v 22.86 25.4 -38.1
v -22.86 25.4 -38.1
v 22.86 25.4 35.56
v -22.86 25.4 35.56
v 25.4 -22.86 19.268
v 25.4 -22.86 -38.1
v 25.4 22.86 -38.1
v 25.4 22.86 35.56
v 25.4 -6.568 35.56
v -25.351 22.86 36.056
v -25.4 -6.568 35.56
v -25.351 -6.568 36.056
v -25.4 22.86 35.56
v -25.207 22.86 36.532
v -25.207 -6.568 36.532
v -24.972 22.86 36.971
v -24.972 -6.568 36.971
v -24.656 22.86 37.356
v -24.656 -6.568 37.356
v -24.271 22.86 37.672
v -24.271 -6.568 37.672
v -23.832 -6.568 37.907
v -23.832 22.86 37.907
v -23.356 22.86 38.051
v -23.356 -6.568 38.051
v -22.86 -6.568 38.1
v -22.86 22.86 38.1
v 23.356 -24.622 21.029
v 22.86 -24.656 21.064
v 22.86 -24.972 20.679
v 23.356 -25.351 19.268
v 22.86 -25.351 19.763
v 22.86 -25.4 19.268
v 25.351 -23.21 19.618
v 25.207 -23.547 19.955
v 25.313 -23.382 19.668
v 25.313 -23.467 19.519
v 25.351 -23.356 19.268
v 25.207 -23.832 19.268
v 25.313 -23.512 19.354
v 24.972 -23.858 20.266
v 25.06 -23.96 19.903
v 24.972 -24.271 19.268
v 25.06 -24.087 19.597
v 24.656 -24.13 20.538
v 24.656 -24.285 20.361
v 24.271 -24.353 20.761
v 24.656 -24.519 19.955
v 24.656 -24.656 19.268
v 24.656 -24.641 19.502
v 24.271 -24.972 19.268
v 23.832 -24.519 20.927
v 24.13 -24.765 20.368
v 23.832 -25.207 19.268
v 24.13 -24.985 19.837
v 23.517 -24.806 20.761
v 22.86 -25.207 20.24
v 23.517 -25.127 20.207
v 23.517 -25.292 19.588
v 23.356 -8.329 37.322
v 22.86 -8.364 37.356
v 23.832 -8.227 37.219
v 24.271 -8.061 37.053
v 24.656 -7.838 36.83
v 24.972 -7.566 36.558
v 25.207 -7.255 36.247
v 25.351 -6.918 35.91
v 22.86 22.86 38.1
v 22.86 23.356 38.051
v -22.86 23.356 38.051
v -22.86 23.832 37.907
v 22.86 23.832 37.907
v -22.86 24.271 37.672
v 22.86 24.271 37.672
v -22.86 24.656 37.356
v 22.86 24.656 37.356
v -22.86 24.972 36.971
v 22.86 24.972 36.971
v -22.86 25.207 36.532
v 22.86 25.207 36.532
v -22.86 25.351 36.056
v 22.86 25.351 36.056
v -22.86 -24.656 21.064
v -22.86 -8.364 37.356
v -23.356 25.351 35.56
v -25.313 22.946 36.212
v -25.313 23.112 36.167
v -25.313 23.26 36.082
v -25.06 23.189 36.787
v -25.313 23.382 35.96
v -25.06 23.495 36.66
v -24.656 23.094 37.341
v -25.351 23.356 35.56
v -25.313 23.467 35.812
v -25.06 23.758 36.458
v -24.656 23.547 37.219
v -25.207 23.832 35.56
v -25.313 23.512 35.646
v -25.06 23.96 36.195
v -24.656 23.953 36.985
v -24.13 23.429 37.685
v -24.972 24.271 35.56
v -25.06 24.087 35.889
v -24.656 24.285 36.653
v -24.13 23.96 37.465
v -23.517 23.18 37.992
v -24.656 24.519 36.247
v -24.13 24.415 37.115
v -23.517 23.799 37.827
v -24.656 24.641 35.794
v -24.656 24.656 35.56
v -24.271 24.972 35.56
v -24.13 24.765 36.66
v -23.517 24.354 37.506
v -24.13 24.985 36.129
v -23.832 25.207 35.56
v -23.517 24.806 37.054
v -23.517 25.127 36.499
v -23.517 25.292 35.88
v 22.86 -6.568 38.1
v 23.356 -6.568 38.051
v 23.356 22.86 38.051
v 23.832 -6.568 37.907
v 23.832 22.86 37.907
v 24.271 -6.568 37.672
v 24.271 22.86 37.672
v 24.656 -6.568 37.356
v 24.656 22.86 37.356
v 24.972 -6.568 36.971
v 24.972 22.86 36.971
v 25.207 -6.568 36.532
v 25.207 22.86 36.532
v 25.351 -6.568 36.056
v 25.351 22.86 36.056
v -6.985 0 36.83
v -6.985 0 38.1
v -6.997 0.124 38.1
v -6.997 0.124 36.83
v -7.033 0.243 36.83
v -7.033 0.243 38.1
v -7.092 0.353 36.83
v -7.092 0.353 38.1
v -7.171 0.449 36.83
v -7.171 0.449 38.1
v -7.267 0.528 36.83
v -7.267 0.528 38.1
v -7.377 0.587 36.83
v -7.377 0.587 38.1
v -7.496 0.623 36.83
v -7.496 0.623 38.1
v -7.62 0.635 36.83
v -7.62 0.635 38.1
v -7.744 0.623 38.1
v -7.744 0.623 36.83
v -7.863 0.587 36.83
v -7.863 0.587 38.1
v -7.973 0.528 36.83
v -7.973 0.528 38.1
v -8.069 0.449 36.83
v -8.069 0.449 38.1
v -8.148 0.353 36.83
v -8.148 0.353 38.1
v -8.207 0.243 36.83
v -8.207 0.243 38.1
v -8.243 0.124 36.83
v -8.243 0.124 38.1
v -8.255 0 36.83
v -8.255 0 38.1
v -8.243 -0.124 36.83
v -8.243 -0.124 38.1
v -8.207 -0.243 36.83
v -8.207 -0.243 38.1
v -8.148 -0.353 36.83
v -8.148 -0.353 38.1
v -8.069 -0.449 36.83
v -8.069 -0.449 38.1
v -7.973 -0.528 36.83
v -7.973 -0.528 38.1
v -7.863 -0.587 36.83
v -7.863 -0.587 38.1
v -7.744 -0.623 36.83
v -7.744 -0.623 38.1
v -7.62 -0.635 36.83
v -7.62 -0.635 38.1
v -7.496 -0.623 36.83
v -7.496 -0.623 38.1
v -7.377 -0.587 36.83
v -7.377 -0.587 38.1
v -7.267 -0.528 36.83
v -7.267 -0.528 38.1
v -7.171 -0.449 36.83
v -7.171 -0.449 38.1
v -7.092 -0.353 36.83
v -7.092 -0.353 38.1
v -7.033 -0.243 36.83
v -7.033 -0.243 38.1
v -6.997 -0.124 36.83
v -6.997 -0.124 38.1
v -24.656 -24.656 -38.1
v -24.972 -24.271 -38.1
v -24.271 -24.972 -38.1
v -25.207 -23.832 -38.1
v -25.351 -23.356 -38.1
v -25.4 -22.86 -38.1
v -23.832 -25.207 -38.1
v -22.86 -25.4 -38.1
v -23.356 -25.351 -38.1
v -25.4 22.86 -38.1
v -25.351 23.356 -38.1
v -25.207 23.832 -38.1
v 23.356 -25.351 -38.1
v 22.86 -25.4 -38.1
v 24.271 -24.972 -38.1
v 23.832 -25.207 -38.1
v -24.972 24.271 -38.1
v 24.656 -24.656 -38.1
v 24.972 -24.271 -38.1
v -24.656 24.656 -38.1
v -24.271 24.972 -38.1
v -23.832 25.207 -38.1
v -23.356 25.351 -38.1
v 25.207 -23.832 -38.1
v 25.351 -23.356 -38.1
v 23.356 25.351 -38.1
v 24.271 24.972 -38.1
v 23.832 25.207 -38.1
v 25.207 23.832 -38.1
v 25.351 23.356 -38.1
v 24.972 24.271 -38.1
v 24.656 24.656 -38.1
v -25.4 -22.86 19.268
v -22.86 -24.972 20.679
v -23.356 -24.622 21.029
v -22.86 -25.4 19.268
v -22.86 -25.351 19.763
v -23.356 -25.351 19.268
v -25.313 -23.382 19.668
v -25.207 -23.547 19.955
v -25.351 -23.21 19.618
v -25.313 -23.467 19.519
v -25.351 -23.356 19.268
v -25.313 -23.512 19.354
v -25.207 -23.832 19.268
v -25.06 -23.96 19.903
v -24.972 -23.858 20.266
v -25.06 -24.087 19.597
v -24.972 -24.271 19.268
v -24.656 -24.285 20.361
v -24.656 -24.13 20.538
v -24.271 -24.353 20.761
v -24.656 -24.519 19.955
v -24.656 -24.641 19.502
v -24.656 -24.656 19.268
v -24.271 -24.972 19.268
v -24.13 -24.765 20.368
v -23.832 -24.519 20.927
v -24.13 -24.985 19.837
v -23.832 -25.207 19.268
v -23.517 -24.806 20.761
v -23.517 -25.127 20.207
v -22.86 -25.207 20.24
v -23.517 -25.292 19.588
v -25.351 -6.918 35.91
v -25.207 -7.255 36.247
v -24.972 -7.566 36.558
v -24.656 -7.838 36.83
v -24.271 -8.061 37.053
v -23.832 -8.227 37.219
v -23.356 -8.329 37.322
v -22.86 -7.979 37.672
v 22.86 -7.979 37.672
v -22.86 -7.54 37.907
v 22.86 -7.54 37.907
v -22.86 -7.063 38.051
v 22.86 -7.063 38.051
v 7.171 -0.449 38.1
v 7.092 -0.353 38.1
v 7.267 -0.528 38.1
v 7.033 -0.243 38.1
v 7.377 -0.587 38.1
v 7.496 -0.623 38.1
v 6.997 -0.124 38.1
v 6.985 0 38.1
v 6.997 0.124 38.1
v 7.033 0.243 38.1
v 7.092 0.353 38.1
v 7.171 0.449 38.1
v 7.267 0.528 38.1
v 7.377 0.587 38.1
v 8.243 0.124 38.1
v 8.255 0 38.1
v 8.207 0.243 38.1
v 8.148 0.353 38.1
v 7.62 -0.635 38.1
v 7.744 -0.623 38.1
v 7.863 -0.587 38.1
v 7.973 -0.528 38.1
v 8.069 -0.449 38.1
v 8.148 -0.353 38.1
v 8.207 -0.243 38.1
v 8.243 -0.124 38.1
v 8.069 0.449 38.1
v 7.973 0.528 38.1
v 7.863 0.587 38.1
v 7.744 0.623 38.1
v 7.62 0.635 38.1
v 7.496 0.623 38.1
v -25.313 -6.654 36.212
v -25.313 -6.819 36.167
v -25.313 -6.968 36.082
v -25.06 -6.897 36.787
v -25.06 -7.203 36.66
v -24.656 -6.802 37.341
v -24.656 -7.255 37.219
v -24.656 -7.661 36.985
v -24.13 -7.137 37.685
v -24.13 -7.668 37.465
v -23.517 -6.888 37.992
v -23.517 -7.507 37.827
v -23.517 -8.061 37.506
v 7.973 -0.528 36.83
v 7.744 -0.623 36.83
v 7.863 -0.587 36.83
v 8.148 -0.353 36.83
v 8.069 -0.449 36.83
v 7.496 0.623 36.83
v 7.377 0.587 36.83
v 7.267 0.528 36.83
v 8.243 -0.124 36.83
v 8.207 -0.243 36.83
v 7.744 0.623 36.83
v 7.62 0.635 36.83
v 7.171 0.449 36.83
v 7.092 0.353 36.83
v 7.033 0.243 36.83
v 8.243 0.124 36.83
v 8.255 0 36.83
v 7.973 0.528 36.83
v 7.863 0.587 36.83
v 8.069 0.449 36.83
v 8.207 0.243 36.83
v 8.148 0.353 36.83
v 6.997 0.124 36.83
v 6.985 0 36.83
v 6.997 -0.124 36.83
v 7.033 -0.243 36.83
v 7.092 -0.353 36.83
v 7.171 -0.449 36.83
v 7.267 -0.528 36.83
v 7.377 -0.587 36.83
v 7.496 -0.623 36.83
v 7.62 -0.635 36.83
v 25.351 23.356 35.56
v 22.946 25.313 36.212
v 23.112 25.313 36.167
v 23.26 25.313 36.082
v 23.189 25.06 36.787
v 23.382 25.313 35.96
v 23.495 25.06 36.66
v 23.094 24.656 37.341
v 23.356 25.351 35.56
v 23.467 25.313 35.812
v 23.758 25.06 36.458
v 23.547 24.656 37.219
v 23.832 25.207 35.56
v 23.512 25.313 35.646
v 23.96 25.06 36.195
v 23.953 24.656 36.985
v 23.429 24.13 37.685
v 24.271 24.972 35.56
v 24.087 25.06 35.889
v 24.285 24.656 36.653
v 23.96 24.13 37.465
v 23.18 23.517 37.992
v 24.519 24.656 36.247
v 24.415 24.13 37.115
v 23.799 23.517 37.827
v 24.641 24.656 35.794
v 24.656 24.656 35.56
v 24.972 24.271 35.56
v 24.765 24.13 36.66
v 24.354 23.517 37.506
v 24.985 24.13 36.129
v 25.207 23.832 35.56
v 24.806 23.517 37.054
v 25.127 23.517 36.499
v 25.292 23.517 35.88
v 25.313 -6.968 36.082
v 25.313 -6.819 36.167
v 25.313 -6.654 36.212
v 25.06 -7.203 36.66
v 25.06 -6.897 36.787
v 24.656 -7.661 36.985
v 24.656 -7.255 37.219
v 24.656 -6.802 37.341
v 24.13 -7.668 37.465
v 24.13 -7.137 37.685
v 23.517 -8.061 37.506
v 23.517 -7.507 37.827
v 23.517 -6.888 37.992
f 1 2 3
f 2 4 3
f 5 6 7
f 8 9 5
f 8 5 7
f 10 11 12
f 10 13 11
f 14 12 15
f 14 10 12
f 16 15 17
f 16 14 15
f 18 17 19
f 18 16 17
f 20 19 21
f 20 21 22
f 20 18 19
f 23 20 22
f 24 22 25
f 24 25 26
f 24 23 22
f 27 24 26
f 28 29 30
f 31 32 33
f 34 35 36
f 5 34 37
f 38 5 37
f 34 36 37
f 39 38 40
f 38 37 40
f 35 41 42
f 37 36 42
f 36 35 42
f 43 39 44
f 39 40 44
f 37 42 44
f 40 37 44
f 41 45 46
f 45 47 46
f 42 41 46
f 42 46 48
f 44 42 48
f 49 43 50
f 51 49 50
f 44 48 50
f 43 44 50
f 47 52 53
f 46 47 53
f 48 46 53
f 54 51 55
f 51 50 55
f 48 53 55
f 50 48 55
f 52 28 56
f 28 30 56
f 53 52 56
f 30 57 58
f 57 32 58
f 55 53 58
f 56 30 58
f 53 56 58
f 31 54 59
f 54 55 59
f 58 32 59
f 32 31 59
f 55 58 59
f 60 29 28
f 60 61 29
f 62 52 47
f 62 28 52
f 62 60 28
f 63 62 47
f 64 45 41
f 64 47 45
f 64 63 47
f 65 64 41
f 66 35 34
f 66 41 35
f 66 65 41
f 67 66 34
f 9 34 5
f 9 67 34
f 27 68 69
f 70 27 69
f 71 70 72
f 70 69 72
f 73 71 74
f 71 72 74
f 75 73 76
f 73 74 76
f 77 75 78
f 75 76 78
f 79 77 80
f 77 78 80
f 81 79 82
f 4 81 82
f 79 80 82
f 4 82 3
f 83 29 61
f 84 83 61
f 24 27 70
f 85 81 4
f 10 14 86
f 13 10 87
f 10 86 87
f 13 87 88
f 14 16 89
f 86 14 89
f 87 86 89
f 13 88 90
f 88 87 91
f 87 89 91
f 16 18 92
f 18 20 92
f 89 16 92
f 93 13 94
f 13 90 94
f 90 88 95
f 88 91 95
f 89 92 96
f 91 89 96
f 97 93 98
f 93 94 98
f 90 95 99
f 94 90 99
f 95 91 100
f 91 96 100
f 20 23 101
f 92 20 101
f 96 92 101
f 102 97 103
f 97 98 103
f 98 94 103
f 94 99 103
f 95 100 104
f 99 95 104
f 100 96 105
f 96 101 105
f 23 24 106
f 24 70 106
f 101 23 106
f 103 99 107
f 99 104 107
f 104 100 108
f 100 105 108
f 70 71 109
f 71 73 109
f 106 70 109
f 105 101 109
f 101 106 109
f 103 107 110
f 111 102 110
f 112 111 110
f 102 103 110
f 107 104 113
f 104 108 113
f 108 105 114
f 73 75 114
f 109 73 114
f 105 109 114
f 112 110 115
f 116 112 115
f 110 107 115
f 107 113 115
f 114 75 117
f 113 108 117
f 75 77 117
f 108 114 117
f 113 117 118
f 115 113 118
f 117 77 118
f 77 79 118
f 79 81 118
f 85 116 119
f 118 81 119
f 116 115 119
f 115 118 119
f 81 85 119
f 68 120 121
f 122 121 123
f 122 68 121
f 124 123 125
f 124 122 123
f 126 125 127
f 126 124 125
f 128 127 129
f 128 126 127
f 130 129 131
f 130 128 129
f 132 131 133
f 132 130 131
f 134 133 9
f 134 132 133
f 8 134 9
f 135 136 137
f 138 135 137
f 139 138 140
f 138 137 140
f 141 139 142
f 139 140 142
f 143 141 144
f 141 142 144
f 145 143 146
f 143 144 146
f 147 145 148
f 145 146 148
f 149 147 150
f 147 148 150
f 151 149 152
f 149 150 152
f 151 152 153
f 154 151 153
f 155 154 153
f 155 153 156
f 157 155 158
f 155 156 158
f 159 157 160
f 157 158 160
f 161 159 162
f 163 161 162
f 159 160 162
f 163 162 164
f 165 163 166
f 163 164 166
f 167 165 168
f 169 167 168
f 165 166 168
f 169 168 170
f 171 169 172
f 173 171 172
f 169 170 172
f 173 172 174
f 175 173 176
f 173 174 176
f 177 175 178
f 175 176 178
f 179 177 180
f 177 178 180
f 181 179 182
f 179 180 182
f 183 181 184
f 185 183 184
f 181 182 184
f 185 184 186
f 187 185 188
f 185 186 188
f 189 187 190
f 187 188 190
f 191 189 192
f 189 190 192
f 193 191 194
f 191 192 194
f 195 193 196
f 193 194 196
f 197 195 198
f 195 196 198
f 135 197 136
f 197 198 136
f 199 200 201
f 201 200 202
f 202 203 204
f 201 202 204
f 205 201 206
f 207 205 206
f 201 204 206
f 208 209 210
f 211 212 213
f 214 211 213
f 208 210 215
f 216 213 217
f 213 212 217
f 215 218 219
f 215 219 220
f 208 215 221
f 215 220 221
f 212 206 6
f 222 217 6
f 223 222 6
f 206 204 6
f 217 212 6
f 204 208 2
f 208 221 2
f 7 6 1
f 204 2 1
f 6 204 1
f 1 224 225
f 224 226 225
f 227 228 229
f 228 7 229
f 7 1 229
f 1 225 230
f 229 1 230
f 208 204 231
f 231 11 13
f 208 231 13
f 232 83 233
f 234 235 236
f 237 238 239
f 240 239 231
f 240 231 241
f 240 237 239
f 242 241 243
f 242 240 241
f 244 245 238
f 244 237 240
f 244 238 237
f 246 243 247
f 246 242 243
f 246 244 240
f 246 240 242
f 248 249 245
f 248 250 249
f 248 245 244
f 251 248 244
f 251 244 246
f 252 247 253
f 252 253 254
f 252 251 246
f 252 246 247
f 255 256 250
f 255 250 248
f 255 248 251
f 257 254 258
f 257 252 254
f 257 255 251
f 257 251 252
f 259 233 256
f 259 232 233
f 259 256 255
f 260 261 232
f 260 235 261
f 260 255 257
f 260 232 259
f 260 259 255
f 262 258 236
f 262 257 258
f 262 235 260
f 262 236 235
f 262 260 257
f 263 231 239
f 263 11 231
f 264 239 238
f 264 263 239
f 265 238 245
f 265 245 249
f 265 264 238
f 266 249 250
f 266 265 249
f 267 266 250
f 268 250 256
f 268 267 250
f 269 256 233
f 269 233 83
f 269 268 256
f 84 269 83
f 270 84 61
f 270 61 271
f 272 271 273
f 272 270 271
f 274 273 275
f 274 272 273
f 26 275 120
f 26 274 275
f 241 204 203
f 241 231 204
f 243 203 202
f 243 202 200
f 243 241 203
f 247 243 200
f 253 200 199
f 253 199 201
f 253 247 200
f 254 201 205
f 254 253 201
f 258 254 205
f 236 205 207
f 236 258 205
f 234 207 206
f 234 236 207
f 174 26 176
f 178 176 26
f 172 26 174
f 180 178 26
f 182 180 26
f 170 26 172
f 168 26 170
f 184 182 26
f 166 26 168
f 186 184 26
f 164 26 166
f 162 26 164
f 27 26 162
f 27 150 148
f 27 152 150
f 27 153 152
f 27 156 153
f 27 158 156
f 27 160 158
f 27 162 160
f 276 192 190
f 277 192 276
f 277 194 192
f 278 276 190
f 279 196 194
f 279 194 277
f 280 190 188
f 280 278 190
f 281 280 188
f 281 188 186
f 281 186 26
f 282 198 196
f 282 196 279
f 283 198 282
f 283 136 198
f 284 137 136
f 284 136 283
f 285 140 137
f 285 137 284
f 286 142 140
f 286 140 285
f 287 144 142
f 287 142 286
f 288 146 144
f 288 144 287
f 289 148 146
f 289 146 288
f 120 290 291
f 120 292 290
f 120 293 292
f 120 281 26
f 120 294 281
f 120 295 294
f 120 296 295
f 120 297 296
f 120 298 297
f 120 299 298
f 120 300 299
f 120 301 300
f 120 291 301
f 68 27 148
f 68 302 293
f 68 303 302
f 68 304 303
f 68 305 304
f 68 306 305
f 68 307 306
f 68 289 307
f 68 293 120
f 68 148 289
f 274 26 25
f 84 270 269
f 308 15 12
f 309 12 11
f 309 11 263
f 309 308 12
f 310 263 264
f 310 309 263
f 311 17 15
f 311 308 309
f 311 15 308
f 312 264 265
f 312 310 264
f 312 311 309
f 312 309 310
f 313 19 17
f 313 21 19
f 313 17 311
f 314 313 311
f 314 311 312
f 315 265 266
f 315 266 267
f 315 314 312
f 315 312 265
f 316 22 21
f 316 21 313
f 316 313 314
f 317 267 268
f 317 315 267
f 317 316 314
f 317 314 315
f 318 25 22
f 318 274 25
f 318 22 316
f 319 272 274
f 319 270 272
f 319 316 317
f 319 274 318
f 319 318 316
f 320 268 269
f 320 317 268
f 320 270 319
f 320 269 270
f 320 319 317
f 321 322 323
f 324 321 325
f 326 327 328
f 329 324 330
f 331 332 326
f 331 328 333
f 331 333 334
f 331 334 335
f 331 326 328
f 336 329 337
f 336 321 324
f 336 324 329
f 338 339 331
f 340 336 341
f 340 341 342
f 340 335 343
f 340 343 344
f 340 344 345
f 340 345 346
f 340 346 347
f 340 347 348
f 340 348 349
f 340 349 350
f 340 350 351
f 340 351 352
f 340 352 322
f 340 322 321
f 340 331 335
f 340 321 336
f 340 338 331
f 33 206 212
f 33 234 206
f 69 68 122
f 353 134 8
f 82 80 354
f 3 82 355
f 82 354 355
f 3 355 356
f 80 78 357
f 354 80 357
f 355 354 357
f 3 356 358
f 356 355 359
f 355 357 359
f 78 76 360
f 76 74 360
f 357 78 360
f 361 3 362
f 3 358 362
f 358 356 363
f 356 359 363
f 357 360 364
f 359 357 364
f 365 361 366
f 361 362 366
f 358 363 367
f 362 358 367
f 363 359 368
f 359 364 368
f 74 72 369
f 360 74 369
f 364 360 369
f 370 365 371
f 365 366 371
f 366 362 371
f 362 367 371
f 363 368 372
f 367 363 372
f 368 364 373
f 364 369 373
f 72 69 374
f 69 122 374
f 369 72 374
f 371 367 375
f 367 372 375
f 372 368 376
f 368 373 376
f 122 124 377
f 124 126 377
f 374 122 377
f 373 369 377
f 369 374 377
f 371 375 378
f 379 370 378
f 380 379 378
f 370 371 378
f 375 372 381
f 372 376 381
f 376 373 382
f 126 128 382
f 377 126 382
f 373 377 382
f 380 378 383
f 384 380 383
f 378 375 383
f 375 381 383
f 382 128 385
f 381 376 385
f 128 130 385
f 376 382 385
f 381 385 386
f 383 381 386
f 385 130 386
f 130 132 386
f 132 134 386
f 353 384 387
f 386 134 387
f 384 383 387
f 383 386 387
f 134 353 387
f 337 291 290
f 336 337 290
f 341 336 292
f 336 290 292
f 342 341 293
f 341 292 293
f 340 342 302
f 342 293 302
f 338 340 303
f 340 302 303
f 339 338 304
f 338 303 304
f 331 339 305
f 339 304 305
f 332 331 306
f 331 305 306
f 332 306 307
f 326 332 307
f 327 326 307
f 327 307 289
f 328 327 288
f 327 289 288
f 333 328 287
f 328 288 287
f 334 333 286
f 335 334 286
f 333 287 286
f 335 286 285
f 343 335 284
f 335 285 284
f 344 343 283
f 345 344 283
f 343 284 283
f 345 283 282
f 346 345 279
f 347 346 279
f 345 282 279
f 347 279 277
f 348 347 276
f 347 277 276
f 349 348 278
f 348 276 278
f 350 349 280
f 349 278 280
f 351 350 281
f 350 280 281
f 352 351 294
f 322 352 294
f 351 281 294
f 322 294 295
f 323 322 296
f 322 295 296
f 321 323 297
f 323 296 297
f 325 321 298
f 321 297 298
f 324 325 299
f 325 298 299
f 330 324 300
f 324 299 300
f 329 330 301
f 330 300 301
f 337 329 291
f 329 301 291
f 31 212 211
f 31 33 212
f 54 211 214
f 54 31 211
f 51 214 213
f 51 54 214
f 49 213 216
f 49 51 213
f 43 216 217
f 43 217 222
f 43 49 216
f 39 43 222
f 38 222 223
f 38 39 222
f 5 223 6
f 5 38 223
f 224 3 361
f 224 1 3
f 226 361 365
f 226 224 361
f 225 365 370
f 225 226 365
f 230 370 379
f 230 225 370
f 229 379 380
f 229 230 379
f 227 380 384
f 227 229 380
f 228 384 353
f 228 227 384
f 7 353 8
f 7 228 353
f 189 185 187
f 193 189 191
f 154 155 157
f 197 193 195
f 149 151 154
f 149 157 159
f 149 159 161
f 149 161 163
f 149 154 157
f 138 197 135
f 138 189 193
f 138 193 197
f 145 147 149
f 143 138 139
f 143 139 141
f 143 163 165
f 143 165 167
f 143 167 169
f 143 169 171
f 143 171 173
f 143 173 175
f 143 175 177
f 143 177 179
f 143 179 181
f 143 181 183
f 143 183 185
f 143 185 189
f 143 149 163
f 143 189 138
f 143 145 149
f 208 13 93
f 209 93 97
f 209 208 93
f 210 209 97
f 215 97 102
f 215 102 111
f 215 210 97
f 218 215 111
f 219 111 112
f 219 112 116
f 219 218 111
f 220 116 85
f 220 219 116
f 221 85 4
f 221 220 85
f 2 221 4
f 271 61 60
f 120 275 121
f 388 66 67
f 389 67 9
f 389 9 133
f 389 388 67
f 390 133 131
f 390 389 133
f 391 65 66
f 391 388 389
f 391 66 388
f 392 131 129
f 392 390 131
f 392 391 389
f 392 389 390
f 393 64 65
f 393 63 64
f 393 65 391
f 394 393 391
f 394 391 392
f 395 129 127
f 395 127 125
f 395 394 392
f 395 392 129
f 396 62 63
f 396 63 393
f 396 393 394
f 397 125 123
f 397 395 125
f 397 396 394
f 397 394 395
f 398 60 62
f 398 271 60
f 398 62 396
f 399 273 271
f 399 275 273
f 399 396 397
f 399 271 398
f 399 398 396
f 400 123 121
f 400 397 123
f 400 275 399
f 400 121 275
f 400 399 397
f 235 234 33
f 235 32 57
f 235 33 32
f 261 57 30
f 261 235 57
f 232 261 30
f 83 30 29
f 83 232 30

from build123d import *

# Parameters (mm, degrees)
F0_W     = 50.8
F0_H     = 50.8
F1_DEPTH = 38.1
F2_R     = 0.635
F3_DEPTH = 1.27
F5_DEPTH = 50.801
F6_R     = 2.54


with BuildPart() as f1:
    # F0 (on Top) → F1 (new body, symmetric)
    with BuildSketch(Plane.XY):
        Rectangle(F0_W, F0_H)
    extrude(amount=F1_DEPTH, both=True)

    # F2 (on face) → F3 (cut)
    with BuildSketch(Plane.XY.offset(38.1)):
        with Locations((-7.62, 0)):
            Circle(F2_R)
        with Locations((7.62, 0)):
            Circle(F2_R)
    extrude(amount=-F3_DEPTH, mode=Mode.SUBTRACT)

    # F4 (on face) → F5 (cut, through all)
    with BuildSketch(Plane.YZ.offset(25.4)):
        Polygon((-25.4, 38.1), (-25.4, 20.32), (-7.62, 38.1), align=None)
    extrude(amount=-F5_DEPTH, mode=Mode.SUBTRACT)

    # F6
    f6_edges = [f1.edges().sort_by_distance(p)[0] for p in [
        (0, -7.62, 38.1),
        (0, -25.4, 20.32),
        (25.4, -16.51, 29.21),
        (25.4, 8.89, 38.1),
        (0, 25.4, 38.1),
        (25.4, 25.4, 0),
        (-25.4, 8.89, 38.1),
        (-25.4, -16.51, 29.21),
        (25.4, -25.4, -8.89),
        (-25.4, -25.4, -8.89),
        (-25.4, 25.4, 0),
    ]]
    fillet(f6_edges, radius=F6_R)


solid = f1.part
